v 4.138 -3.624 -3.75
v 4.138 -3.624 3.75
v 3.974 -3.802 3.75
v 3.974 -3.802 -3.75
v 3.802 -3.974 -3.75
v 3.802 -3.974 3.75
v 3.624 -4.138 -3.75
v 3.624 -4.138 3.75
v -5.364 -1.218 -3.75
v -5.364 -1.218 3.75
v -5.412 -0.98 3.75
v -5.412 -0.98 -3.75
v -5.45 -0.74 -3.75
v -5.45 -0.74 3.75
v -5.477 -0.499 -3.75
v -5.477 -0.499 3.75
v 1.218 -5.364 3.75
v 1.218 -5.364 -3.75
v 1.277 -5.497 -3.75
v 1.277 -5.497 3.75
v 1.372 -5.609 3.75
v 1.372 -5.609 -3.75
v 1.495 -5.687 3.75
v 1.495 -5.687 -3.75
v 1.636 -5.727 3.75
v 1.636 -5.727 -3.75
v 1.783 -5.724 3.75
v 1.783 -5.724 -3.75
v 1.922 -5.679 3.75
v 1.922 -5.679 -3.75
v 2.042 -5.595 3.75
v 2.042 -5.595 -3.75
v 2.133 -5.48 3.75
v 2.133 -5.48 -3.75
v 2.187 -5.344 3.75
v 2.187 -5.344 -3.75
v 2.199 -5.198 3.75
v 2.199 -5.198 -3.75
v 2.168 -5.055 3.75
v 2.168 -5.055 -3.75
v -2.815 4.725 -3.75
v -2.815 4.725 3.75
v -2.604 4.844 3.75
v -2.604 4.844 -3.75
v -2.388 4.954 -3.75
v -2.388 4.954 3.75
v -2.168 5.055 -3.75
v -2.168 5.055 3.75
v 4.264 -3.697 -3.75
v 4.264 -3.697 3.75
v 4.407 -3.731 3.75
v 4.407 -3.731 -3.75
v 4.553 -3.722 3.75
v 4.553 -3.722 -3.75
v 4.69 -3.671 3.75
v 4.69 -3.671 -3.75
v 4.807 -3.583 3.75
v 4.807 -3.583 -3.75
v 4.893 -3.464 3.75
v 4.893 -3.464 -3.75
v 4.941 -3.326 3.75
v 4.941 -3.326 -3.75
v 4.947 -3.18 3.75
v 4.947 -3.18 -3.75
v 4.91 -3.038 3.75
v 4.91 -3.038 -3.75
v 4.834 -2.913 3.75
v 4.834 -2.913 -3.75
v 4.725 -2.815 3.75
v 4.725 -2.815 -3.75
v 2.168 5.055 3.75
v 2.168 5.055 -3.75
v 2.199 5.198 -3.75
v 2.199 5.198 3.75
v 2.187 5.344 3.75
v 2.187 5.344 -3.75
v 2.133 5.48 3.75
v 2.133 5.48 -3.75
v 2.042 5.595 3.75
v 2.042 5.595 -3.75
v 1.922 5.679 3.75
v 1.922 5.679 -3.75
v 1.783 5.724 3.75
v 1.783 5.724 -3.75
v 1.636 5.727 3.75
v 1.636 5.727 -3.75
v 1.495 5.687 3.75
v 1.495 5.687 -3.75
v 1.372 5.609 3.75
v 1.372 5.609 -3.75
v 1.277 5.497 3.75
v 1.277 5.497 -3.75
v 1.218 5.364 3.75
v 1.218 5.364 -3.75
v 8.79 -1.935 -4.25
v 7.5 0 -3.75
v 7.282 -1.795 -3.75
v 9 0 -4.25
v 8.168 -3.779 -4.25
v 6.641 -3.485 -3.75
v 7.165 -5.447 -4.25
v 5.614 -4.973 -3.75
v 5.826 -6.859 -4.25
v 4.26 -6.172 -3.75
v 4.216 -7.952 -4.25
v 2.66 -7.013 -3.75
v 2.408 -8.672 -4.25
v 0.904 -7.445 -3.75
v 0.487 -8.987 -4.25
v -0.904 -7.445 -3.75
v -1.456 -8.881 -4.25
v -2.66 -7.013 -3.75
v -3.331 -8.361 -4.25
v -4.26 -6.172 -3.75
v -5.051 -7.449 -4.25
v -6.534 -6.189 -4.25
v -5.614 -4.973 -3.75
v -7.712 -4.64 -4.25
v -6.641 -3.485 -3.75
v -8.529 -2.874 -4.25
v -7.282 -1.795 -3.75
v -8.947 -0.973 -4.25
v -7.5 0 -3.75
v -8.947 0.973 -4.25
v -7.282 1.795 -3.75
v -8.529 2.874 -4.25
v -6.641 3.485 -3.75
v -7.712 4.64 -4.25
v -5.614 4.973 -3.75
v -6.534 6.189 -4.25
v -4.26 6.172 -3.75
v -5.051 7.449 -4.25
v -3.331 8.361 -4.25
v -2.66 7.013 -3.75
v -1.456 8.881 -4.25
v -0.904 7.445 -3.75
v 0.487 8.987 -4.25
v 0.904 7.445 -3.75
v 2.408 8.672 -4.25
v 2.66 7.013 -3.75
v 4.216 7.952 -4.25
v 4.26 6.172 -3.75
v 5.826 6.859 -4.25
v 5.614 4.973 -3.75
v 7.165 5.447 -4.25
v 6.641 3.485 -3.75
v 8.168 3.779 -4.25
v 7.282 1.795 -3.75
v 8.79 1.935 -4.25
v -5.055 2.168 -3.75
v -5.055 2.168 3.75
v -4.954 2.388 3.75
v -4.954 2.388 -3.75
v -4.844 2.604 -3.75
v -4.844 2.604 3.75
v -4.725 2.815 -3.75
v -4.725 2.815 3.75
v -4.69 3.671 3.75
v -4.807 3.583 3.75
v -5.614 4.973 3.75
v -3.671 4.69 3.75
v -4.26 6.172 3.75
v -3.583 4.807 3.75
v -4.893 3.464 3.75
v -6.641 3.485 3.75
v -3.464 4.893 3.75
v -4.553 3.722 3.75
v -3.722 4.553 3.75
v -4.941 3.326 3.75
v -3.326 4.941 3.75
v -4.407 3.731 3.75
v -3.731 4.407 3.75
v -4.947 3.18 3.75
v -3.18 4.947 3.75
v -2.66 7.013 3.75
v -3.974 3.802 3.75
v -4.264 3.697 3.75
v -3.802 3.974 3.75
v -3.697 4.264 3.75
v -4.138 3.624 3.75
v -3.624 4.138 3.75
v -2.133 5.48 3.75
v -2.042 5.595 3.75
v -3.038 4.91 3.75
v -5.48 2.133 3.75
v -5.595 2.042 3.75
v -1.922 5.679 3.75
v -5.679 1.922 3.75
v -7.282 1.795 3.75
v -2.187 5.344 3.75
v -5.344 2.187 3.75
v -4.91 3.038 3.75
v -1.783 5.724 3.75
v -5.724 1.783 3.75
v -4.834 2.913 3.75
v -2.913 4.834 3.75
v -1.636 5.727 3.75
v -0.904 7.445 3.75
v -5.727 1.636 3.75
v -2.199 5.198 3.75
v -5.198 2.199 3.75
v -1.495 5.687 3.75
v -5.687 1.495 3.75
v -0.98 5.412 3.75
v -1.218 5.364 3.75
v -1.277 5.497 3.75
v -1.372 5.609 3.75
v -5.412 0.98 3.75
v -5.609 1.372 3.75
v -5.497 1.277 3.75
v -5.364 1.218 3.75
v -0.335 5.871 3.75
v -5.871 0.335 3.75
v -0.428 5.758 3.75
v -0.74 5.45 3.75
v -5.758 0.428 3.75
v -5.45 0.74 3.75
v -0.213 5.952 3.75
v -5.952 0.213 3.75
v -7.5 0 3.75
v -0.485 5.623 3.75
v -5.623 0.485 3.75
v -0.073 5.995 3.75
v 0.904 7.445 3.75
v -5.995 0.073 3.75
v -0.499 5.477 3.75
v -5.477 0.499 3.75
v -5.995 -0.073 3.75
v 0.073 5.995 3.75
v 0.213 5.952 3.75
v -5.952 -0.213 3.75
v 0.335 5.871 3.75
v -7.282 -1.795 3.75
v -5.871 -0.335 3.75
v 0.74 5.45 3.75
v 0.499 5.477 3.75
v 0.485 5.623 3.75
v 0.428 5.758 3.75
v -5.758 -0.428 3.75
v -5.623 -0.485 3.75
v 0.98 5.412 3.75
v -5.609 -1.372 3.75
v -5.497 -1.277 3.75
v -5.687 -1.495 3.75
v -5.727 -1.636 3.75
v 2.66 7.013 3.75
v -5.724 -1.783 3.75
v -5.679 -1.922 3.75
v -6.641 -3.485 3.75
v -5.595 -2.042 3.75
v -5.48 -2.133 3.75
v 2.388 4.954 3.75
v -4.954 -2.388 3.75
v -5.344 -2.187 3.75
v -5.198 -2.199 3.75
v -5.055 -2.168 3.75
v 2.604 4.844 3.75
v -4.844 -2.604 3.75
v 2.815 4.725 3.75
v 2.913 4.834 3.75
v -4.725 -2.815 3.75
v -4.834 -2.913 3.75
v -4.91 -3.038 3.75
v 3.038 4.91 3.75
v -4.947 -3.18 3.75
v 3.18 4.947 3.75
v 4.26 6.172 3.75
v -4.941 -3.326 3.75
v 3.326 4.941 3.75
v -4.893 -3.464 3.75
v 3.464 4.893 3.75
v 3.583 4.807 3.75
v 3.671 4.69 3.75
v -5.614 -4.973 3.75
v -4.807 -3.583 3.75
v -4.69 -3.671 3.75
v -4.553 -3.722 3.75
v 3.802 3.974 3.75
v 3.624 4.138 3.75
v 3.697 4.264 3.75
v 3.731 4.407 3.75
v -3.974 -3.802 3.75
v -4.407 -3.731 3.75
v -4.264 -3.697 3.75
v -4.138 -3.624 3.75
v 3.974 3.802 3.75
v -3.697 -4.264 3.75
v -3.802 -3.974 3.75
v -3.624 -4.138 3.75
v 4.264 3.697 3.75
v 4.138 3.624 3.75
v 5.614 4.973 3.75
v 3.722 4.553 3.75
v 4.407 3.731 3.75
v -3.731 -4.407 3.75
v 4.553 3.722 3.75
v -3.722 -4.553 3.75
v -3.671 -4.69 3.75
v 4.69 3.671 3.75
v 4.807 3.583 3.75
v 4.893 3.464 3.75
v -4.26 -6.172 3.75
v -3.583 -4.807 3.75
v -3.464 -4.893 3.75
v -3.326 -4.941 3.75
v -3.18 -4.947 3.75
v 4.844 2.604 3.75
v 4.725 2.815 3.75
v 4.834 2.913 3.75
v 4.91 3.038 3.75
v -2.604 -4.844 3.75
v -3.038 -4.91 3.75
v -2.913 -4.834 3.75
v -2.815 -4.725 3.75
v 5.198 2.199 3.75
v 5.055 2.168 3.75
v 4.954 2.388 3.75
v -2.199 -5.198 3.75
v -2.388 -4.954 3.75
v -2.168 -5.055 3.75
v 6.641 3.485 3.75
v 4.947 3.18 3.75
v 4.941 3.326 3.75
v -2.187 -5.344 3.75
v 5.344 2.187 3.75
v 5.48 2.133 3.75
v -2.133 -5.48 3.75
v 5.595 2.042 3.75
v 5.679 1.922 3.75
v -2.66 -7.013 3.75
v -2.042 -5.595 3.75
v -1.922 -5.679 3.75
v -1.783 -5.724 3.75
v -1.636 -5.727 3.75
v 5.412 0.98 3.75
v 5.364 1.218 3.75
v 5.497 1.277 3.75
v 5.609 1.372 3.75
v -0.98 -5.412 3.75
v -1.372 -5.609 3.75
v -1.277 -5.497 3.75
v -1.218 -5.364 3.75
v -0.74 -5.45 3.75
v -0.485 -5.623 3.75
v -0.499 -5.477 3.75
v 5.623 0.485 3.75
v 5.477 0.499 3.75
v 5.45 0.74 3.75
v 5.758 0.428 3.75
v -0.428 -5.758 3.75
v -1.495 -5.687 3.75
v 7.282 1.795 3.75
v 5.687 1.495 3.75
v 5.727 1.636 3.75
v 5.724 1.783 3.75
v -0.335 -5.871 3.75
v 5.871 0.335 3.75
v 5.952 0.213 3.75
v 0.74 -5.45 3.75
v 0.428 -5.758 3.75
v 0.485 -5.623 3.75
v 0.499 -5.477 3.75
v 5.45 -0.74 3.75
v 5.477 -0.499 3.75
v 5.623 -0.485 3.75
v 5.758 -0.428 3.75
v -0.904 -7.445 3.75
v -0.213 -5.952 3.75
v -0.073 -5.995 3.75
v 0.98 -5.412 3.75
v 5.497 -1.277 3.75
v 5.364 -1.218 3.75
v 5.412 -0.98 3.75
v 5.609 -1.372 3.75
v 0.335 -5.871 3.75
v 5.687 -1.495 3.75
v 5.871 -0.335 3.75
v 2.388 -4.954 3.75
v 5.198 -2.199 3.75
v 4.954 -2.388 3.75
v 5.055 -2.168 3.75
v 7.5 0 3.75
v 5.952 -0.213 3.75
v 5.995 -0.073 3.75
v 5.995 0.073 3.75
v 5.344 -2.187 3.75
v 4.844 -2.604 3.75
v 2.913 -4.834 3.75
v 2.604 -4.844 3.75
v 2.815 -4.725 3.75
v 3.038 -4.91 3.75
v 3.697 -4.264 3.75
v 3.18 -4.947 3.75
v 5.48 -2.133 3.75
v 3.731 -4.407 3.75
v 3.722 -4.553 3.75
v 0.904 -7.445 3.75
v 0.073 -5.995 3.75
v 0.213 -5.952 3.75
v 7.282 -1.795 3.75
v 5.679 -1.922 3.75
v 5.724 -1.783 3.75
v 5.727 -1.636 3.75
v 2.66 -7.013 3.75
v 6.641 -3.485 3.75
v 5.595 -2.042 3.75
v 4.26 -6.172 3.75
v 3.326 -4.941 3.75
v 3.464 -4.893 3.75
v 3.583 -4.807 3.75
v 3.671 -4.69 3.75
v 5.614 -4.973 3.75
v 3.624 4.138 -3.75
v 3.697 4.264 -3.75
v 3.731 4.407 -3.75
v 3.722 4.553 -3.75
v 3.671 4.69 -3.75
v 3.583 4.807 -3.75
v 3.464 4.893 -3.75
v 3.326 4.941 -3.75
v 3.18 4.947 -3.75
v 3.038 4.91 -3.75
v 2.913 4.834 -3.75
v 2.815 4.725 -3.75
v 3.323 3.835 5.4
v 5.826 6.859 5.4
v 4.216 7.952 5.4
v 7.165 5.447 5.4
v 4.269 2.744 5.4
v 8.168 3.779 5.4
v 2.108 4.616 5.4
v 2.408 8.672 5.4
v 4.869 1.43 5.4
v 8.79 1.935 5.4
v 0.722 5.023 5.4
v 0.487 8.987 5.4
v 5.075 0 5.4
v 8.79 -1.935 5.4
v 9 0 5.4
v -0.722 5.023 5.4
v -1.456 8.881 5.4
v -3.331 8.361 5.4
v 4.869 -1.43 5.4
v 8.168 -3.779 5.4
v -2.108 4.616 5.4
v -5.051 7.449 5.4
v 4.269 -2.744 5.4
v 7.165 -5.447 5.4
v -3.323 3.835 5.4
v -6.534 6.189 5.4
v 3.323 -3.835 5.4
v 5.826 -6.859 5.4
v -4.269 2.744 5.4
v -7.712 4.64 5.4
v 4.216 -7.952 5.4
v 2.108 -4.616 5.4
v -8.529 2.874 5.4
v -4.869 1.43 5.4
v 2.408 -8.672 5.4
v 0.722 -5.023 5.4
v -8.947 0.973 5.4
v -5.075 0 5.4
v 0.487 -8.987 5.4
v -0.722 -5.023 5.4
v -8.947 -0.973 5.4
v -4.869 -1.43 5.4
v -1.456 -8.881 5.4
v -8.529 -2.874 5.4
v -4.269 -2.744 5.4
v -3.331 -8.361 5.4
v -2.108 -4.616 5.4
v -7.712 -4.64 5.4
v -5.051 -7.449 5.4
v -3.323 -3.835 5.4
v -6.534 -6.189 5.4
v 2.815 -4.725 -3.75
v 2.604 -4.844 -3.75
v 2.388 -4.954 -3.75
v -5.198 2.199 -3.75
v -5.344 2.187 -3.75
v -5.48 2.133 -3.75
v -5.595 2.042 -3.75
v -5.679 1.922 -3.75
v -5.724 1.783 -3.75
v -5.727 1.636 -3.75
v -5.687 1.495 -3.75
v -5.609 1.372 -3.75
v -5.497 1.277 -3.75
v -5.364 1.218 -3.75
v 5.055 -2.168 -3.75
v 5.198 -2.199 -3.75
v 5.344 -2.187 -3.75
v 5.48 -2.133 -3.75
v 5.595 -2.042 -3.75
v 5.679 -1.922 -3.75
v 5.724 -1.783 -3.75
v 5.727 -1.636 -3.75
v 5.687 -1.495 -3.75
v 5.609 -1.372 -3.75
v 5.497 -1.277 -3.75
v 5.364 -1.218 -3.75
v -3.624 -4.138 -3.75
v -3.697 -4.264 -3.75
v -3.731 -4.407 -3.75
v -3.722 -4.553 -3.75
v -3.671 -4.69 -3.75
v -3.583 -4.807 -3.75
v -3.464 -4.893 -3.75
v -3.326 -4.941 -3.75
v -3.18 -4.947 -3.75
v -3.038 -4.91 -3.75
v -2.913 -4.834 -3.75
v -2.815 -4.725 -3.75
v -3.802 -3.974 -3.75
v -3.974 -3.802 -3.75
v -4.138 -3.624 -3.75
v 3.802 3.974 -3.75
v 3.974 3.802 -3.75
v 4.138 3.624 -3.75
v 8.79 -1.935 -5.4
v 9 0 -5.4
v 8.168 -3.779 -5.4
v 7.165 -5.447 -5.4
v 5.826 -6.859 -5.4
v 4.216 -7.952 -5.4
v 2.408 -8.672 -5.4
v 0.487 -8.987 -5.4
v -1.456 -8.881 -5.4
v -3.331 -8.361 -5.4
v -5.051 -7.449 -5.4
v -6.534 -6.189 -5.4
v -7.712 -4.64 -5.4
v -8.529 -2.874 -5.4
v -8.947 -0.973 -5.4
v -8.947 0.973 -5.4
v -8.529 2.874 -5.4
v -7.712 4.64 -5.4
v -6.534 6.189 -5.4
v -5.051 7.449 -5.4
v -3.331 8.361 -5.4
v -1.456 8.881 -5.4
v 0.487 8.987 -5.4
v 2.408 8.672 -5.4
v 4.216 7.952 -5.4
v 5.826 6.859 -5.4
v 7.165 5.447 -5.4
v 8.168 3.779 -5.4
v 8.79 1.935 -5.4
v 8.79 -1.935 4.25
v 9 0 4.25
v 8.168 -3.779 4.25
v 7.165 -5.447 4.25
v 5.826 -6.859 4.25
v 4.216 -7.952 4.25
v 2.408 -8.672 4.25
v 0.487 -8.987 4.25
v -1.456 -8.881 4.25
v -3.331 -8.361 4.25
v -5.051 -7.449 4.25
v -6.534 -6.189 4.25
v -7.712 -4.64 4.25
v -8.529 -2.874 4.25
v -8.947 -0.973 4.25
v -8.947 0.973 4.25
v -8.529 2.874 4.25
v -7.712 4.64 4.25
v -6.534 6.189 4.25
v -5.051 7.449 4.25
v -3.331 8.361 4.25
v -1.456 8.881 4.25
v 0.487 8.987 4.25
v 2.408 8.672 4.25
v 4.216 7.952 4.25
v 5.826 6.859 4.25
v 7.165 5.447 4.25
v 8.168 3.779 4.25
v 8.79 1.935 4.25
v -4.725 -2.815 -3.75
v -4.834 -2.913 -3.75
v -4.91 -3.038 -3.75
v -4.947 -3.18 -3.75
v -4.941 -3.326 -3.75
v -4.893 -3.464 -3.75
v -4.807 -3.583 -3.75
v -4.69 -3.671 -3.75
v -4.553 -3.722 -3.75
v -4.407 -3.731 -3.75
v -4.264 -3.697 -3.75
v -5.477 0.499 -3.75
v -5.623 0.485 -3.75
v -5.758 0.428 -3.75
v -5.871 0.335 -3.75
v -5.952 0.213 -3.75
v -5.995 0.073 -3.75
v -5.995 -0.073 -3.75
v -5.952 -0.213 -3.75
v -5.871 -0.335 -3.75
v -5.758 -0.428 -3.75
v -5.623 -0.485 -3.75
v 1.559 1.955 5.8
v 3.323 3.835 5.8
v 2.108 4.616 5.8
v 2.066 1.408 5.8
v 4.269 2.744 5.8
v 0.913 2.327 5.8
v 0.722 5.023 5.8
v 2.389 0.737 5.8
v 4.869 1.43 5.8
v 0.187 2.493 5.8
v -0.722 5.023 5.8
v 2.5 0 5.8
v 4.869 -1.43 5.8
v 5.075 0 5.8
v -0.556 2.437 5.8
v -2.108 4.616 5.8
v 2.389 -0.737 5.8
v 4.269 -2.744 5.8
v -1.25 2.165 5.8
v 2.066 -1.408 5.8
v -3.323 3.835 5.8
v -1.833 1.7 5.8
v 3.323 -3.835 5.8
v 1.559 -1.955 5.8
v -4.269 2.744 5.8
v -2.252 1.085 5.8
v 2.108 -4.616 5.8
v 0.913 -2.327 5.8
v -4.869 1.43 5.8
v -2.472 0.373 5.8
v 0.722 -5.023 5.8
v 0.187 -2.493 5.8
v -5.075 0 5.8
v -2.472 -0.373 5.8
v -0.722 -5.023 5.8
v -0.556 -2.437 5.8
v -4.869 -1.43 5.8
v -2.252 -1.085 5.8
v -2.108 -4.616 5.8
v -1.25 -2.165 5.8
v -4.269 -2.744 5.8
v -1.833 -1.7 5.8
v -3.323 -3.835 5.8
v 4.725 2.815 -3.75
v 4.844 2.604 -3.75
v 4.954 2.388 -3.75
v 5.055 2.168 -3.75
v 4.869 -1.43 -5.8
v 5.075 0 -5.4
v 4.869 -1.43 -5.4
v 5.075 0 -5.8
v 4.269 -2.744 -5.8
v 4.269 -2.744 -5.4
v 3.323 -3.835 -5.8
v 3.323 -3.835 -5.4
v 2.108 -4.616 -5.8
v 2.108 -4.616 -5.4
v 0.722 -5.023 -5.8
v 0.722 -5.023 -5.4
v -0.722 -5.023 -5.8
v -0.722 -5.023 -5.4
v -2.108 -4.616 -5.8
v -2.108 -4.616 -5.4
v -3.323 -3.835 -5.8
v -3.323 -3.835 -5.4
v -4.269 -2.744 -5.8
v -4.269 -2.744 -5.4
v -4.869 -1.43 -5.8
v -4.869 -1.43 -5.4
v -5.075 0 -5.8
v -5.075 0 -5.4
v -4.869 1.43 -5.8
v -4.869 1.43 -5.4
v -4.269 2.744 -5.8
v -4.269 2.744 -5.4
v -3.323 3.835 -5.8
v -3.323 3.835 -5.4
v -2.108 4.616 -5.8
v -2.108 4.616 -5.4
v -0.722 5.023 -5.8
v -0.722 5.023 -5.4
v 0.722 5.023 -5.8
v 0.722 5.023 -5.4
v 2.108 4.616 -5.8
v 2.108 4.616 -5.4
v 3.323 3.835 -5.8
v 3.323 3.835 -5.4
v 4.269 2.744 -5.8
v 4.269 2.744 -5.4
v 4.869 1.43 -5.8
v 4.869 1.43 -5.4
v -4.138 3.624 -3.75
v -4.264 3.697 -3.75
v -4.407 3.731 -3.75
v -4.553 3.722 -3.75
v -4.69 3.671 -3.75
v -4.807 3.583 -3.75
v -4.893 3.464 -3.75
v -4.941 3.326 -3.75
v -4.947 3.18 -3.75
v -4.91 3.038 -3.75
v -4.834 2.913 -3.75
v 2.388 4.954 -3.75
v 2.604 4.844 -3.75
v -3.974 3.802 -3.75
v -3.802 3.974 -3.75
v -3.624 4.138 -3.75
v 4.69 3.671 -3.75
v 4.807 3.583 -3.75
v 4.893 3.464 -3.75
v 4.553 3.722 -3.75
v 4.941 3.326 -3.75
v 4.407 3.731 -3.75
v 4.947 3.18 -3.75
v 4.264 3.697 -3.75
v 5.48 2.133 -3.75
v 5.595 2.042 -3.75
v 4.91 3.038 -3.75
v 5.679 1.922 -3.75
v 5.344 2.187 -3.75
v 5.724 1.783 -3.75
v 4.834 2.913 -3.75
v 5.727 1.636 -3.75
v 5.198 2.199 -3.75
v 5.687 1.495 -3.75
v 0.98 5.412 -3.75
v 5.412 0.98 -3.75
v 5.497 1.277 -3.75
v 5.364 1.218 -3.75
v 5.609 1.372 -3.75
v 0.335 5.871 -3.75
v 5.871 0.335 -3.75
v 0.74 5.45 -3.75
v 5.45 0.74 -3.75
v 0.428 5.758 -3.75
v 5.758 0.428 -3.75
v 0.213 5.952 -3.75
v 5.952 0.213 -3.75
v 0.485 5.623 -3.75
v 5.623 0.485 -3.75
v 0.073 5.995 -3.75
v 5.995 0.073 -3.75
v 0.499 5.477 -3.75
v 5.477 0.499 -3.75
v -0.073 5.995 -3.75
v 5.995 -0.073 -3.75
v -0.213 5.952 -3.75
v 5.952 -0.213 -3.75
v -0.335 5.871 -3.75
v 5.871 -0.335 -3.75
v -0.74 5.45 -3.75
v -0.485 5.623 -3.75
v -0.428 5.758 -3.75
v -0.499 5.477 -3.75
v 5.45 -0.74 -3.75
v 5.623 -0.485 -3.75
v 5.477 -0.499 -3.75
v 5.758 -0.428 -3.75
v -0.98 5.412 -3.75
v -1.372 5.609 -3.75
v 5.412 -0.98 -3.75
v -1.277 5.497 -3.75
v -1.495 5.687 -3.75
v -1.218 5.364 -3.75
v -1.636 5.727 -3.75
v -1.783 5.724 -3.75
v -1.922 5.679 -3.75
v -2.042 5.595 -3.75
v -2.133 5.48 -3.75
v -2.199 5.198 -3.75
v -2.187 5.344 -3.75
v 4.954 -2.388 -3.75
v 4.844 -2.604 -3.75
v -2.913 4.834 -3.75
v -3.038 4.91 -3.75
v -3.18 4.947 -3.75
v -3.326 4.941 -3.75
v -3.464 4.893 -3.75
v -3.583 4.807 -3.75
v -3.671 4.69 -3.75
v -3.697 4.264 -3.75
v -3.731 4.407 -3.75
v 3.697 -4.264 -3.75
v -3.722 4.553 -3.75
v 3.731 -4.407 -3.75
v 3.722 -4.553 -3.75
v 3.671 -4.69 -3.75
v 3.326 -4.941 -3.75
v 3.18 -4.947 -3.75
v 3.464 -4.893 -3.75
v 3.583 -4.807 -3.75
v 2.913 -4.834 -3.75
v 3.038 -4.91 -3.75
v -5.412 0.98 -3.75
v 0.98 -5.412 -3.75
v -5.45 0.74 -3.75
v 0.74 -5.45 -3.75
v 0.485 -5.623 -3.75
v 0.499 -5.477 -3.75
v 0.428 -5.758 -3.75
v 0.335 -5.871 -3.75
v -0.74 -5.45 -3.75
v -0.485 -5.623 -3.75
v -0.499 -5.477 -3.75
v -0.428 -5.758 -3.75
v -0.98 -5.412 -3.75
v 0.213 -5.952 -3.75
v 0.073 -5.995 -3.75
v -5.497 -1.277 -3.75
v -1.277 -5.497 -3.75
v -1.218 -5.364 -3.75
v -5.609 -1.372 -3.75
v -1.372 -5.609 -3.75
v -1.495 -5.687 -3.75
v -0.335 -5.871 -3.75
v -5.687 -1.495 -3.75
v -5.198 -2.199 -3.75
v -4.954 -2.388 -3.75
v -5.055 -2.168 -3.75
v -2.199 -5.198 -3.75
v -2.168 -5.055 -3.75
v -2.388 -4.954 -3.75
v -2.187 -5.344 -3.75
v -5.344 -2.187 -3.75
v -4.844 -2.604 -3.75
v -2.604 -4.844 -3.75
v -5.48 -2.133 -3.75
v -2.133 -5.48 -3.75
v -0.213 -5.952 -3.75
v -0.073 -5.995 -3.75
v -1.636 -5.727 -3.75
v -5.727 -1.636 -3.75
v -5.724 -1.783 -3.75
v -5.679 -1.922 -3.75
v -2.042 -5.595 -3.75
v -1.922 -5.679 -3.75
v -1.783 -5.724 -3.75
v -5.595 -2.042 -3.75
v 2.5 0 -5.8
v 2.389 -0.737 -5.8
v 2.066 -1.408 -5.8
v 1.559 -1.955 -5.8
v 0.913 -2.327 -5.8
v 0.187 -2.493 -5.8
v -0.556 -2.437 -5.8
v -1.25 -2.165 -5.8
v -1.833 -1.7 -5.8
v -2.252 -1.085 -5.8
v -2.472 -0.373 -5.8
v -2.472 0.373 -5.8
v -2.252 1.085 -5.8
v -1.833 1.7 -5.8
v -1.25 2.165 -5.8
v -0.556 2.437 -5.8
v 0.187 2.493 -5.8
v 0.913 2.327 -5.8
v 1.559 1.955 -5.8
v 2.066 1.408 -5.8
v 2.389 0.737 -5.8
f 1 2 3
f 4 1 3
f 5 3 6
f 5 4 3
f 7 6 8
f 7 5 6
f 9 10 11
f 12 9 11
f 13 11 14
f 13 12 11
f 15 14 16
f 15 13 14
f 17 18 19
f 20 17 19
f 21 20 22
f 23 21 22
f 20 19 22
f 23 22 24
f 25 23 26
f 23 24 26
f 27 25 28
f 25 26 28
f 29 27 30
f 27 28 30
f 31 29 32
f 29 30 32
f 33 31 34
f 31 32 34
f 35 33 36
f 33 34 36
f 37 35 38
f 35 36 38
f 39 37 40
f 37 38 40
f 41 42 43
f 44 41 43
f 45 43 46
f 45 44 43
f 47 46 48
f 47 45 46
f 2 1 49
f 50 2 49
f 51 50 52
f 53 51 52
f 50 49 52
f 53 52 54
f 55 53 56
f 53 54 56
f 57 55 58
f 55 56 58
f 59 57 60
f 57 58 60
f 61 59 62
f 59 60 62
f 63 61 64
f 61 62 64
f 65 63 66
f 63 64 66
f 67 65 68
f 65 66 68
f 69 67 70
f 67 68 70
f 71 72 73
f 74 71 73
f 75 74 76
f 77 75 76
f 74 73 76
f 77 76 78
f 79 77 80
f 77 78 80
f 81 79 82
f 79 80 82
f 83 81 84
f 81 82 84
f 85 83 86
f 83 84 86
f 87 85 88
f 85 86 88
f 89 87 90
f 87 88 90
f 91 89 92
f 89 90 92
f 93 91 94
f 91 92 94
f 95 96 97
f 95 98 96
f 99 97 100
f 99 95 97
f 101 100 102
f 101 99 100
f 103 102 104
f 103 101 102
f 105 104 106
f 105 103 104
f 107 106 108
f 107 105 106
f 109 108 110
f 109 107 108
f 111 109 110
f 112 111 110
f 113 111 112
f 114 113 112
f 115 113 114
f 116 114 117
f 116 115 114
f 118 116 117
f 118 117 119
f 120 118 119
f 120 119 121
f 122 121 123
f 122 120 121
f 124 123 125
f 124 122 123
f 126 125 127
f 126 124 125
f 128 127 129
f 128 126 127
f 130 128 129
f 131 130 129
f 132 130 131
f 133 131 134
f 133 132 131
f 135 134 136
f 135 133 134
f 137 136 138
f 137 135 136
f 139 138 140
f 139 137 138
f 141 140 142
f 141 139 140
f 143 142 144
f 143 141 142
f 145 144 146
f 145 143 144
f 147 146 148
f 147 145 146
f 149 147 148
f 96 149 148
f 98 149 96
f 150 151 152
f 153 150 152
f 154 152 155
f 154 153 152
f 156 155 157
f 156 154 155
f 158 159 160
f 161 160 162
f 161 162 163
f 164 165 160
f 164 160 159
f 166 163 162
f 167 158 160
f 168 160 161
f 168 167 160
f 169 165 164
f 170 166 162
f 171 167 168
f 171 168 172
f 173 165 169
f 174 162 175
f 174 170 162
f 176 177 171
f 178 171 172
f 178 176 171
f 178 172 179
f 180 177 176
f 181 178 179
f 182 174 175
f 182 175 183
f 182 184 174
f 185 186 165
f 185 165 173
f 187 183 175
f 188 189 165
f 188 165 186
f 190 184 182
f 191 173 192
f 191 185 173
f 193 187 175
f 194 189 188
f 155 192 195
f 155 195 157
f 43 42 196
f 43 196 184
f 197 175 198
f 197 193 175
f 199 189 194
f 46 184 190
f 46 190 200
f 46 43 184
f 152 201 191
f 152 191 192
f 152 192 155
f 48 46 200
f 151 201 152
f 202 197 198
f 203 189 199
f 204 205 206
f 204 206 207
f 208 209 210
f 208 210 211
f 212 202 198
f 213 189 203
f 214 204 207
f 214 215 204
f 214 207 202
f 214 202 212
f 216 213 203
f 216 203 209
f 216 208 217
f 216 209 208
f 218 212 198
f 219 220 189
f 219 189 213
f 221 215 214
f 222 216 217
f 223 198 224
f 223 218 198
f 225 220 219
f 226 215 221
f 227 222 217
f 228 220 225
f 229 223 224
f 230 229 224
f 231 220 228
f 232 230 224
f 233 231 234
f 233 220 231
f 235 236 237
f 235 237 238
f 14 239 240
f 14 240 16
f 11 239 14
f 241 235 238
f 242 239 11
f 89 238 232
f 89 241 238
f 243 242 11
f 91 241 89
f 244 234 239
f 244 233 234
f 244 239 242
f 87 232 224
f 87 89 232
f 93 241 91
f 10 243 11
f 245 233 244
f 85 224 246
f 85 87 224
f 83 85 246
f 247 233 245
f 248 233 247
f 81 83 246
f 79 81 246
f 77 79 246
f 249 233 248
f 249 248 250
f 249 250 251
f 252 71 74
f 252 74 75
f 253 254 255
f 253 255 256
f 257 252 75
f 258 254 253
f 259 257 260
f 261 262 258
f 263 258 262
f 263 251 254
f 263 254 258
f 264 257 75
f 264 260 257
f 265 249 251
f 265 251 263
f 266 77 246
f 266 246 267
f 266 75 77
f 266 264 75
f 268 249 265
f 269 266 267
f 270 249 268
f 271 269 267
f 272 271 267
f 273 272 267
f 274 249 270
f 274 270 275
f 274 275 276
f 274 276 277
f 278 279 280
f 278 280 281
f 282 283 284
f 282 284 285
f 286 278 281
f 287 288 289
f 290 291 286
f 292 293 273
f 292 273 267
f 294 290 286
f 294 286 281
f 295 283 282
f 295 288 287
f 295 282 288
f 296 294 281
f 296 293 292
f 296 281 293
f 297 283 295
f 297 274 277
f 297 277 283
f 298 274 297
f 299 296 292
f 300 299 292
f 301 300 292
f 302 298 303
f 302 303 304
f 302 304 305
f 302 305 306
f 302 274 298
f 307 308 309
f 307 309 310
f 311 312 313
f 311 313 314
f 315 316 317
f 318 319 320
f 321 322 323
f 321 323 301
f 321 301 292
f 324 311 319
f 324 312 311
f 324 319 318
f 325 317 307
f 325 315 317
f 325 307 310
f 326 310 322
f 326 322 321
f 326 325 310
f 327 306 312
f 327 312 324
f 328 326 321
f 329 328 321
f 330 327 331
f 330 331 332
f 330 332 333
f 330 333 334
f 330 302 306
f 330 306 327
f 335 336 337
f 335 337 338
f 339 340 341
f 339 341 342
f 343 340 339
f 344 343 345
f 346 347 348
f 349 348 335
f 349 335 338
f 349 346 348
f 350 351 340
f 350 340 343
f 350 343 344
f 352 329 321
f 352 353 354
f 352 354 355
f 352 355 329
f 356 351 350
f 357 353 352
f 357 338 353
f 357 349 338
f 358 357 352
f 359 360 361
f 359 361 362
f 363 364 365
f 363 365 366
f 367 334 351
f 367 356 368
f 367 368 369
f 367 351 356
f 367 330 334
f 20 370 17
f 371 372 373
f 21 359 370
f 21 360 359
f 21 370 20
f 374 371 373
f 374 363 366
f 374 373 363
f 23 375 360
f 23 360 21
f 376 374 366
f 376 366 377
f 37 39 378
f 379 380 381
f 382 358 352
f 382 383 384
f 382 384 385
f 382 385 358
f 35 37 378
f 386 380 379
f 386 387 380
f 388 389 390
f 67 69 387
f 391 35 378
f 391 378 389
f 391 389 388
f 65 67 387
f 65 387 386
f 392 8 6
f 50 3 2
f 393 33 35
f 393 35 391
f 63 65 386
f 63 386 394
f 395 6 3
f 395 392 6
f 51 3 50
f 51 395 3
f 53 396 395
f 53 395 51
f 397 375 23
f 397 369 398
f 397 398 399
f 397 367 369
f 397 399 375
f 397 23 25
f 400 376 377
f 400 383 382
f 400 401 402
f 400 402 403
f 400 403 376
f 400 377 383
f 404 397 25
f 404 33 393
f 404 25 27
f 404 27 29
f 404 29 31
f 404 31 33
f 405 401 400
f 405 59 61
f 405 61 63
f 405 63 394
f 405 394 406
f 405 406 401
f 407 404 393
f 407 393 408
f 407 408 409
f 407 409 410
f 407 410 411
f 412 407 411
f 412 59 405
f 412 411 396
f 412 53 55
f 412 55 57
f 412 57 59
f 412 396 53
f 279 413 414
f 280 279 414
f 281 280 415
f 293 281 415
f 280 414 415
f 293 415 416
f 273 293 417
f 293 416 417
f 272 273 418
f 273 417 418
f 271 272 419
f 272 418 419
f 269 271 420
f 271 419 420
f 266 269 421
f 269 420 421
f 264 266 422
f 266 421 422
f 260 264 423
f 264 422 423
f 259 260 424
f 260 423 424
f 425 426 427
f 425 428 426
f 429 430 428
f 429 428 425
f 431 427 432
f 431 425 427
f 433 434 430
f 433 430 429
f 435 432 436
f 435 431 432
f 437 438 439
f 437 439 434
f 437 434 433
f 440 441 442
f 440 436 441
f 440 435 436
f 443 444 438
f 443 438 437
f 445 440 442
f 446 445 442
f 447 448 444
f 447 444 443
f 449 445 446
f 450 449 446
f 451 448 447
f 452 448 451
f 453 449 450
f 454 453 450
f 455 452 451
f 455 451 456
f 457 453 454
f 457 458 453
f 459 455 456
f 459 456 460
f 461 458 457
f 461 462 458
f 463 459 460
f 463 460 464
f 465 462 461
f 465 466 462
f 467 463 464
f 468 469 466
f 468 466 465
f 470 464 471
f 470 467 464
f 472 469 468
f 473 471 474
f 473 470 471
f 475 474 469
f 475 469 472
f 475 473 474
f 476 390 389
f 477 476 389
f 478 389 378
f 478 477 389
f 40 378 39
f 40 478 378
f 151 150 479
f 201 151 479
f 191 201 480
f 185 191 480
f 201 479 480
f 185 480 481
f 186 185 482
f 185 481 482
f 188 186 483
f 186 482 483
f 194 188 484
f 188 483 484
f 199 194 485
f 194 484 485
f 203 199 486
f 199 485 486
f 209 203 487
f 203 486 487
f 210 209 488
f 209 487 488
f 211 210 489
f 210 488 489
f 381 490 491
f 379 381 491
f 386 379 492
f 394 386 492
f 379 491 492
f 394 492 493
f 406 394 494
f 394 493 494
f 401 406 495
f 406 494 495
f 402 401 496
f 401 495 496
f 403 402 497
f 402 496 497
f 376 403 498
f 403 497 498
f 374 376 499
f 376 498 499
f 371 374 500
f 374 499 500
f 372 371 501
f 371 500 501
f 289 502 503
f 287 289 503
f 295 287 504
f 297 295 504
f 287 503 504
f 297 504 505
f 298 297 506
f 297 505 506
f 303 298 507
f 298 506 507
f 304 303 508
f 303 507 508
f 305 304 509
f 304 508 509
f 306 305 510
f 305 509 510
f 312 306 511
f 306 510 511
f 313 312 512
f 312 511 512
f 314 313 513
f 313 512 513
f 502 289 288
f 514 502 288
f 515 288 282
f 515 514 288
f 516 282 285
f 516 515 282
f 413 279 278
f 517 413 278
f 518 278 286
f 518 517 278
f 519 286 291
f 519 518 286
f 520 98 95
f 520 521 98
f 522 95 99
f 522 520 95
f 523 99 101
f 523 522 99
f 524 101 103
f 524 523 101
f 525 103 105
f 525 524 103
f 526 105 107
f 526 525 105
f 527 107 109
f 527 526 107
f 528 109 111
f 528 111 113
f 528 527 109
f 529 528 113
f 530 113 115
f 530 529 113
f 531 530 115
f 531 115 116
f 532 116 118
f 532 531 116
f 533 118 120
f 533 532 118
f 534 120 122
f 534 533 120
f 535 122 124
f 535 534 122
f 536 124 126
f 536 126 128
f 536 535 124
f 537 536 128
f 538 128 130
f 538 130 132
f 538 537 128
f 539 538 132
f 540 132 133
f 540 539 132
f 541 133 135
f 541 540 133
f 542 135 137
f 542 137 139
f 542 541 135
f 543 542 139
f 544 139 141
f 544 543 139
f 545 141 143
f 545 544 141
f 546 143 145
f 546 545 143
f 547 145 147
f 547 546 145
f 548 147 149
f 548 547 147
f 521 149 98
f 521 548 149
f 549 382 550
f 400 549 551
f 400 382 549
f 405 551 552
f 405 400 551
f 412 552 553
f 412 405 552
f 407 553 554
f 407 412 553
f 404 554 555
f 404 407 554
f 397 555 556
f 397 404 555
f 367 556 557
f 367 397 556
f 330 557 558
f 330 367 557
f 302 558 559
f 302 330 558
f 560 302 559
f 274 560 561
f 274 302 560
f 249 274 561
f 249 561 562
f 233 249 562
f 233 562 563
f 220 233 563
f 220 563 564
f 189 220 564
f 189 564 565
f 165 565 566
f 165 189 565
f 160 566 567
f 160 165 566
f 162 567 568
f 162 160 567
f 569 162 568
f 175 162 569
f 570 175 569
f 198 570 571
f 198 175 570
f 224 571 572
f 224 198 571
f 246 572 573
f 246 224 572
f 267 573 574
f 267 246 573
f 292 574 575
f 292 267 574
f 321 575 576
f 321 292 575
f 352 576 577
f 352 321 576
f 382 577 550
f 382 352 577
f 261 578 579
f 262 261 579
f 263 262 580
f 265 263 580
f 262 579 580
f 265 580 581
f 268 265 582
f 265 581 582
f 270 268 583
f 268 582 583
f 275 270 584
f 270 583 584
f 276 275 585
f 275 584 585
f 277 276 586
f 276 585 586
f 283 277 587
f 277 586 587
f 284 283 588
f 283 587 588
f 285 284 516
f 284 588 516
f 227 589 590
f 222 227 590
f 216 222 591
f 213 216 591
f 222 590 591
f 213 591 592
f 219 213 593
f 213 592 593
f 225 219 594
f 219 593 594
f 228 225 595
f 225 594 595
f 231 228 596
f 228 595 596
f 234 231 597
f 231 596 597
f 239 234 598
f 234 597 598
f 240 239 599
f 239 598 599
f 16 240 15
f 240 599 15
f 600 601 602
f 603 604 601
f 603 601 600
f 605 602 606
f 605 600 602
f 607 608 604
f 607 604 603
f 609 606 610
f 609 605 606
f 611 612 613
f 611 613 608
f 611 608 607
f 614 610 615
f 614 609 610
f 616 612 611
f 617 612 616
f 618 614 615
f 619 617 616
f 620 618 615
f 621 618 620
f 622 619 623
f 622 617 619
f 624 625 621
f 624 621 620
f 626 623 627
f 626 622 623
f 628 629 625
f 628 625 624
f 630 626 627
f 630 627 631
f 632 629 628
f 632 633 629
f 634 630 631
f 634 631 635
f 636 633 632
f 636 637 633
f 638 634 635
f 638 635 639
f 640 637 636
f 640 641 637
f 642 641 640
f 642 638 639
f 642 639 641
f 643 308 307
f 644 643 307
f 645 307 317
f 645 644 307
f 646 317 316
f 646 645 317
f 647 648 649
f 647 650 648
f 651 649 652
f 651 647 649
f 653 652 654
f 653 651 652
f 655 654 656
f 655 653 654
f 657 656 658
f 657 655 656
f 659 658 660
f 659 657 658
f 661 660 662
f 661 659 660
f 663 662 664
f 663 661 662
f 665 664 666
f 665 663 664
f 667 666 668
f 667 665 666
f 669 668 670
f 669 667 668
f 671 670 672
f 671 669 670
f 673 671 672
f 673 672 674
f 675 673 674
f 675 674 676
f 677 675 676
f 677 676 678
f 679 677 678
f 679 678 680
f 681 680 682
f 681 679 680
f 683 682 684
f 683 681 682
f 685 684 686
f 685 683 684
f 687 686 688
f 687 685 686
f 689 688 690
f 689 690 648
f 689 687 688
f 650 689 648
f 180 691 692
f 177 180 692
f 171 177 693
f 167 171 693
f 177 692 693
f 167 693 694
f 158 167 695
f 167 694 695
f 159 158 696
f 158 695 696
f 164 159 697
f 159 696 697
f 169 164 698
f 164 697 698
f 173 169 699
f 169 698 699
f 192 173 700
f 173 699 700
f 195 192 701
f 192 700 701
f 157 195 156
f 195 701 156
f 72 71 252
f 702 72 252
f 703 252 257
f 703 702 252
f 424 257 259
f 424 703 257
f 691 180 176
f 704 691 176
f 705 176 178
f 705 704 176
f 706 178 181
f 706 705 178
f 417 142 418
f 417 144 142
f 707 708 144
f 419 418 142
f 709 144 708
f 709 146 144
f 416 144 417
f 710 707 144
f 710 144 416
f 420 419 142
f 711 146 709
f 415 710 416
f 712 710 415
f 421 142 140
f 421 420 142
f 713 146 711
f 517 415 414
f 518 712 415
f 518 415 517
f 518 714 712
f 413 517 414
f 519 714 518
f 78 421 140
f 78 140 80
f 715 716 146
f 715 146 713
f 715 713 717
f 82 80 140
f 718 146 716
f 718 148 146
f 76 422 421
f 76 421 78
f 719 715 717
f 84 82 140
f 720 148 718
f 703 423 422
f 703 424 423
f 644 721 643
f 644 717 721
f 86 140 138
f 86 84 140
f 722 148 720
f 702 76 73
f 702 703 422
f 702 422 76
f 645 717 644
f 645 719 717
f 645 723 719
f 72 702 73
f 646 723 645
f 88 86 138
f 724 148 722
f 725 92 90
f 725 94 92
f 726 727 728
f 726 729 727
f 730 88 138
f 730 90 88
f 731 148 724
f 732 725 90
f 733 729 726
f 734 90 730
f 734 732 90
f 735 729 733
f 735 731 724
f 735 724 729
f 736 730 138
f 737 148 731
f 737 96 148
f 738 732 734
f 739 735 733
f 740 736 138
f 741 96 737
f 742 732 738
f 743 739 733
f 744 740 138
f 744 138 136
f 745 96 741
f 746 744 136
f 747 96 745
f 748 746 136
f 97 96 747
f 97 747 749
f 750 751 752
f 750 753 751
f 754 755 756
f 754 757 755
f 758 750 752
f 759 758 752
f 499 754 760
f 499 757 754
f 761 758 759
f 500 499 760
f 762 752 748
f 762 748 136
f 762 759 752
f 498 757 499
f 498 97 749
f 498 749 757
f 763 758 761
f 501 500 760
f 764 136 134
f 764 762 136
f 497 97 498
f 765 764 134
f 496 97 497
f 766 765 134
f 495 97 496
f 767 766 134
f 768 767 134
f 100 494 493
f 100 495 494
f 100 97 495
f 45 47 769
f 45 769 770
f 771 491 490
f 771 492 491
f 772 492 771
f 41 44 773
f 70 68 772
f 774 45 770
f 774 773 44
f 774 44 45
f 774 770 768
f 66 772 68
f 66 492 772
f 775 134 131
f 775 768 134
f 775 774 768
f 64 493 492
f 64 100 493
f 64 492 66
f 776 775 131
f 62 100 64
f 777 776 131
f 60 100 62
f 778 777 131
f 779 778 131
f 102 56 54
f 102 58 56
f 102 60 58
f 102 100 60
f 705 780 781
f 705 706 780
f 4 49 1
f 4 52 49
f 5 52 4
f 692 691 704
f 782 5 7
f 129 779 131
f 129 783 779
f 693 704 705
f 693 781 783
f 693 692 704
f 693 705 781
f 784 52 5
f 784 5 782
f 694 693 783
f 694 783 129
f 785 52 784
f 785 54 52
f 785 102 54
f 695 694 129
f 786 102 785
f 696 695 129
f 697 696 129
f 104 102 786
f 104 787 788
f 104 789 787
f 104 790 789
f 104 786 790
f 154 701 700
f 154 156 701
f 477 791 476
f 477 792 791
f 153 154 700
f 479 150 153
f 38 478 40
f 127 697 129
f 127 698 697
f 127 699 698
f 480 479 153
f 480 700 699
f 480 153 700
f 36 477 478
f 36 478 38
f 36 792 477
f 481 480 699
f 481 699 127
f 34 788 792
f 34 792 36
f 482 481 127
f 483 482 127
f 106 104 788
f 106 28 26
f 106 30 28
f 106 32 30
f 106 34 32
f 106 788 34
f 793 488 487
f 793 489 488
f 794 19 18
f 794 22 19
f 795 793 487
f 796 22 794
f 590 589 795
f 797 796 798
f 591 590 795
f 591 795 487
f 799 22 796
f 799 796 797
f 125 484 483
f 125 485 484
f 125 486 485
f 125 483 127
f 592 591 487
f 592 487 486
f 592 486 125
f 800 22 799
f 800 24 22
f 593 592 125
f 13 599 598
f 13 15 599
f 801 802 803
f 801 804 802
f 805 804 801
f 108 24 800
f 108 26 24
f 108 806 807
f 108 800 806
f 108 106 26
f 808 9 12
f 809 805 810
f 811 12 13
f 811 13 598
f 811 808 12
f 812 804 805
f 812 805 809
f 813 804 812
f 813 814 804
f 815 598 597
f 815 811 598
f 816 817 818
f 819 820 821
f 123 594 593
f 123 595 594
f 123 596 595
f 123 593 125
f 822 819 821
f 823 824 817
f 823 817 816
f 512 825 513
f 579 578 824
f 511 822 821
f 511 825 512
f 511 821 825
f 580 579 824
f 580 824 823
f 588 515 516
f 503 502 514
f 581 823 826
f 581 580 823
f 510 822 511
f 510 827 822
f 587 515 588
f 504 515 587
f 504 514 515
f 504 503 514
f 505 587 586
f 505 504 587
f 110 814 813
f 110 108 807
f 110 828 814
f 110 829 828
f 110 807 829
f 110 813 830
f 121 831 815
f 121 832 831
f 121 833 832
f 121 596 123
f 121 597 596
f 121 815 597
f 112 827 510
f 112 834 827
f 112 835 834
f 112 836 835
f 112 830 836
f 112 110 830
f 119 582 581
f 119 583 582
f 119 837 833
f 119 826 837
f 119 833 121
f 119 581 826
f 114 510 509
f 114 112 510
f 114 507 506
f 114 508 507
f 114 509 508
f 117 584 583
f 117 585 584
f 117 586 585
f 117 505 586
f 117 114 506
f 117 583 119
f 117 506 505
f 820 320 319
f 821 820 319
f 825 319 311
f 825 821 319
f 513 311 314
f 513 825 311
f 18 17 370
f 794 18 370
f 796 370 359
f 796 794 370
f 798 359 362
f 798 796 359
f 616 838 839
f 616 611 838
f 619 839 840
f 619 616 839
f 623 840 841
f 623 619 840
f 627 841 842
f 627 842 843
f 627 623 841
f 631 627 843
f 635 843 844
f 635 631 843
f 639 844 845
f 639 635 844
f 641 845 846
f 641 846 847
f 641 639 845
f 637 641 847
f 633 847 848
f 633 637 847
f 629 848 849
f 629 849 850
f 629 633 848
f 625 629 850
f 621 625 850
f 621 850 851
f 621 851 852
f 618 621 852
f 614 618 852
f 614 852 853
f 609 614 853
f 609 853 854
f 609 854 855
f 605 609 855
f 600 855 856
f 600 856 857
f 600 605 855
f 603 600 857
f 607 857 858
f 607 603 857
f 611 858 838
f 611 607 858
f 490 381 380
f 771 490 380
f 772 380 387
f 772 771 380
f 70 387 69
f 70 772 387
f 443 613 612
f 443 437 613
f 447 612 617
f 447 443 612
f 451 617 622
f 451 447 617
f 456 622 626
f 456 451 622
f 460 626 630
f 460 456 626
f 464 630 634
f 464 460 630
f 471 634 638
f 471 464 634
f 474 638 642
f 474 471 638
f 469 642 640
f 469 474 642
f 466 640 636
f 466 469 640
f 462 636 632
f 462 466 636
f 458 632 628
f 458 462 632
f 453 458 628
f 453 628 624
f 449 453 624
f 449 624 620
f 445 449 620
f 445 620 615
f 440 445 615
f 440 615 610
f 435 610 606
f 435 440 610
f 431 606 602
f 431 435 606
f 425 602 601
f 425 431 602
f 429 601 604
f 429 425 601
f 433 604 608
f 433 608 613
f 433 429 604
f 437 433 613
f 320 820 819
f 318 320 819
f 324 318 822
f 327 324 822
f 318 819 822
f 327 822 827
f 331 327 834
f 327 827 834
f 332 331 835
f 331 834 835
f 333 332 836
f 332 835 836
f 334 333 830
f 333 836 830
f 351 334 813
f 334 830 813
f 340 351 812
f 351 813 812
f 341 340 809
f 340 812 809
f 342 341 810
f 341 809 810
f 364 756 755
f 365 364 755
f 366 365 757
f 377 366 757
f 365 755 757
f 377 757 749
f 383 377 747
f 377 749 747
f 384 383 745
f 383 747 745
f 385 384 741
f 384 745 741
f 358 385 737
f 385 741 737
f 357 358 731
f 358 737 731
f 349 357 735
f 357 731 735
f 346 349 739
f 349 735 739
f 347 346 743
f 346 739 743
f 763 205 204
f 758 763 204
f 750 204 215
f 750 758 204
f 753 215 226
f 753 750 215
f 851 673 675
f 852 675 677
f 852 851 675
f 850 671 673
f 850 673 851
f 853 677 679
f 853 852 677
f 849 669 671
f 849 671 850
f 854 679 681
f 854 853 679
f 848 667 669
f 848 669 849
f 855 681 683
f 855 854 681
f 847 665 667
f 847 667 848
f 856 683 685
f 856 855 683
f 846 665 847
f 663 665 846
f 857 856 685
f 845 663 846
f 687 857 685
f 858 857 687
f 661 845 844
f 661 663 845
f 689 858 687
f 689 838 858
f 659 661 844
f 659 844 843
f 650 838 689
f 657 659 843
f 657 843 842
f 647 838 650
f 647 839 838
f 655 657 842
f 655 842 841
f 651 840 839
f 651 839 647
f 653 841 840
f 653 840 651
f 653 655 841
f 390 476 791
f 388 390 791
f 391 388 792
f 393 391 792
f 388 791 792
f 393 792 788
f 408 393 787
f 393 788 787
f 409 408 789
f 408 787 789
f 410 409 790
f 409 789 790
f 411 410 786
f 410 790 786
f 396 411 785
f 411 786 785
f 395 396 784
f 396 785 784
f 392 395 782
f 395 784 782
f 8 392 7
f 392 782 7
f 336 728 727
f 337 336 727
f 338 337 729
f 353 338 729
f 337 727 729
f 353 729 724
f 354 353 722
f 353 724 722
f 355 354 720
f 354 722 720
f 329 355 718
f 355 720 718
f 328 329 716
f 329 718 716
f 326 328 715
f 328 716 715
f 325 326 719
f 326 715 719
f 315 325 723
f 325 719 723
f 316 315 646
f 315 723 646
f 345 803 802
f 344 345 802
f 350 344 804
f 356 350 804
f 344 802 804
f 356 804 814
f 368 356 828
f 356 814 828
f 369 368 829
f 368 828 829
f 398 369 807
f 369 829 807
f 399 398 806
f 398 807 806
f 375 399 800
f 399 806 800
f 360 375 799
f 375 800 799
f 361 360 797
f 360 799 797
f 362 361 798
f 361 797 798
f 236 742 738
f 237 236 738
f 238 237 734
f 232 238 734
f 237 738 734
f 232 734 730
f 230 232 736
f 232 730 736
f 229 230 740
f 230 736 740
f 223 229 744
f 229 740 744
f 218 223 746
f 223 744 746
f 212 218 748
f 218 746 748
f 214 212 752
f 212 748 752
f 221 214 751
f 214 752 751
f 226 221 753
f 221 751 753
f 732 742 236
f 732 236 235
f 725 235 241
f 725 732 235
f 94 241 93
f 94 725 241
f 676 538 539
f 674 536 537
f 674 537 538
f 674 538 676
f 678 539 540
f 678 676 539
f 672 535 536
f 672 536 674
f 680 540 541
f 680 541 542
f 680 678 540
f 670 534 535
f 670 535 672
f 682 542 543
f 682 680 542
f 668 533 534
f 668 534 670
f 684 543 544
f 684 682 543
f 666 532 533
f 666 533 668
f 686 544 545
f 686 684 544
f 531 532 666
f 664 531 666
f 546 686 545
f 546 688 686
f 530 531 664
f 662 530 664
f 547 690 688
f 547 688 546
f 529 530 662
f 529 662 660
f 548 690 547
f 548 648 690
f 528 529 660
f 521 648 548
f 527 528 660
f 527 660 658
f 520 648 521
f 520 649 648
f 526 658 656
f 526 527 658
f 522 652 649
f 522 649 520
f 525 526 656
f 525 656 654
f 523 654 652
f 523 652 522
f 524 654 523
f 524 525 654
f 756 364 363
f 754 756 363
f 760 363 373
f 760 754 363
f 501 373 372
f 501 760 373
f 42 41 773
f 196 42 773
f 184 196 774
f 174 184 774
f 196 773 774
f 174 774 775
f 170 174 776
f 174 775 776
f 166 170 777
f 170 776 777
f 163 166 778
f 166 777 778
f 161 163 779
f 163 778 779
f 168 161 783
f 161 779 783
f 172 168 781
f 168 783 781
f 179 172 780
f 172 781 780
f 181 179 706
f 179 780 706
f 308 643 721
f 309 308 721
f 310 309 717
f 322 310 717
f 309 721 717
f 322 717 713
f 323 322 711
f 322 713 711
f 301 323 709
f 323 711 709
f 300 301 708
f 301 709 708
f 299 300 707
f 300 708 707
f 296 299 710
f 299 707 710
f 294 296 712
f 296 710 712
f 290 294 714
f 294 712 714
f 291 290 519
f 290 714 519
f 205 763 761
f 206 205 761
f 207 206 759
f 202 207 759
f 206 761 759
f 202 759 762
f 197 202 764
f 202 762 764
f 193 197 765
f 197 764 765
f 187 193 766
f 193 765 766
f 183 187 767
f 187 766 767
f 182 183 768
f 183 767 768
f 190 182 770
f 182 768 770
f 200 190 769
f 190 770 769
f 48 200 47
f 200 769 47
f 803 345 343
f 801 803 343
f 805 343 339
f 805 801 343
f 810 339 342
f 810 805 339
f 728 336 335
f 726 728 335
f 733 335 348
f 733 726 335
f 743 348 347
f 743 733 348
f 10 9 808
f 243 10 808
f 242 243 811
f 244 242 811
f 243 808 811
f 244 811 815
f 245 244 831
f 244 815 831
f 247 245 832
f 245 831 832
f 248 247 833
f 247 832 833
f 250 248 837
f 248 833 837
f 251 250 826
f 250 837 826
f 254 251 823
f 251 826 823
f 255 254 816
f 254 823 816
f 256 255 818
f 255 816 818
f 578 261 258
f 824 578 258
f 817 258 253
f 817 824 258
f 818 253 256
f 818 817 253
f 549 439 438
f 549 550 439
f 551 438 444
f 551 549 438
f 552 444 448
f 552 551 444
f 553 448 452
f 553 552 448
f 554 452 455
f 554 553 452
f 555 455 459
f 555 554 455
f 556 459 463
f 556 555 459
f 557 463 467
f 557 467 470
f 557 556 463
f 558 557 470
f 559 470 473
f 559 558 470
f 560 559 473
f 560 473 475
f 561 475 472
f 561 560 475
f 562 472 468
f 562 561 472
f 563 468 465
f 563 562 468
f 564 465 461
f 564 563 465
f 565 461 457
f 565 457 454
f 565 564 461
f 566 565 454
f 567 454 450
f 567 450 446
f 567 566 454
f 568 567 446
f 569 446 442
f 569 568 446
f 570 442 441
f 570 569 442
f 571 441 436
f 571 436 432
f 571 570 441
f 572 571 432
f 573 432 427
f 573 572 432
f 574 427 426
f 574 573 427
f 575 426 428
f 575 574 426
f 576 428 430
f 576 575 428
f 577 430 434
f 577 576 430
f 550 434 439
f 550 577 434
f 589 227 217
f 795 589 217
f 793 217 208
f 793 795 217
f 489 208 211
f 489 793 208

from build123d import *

# Parameters (mm, degrees)
BOSS_EXTRUDE1_DEPTH = 7.5
CIRPATTERN1_COUNT   = 20


with BuildPart() as part:
    # Sketch1 → Revolve1 (revolve)
    with BuildSketch(Plane(origin=(0, 0, 0), x_dir=(0, 0, -1), z_dir=(1, 0, 0)), mode=Mode.PRIVATE) as revolve1_sk:
        Polygon((-3.75, 7.5), (-3.75, 5.5), (3.75, 5.5), (3.75, 7.5), (4.25, 9), (5.4, 9), (5.4, 5.075), (5.8, 5.075), (5.8, 2.5), (-5.8, 2.5), (-5.8, 5.075), (-5.4, 5.075), (-5.4, 9), (-4.25, 9), align=None)
    revolve(revolve1_sk.sketch.rotate(Axis((0, 0, 0), (0, 0, -1)), 90), axis=Axis((0, 0, 0), (0, 0, -1)))

    # Sketch2 → Boss-Extrude1 (add)
    with BuildSketch(Plane.XY.offset(-3.75)):
        with BuildLine():
            ThreePointArc((0.499483204, 5.477272727), (0, 6), (-0.499483204, 5.477272727))
            ThreePointArc((-0.499483204, 5.477272727), (0, 5.5), (0.499483204, 5.477272727))
        make_face()
    boss_extrude1 = extrude(amount=BOSS_EXTRUDE1_DEPTH)

    # CirPattern1: Boss-Extrude1 ×20 about axis
    cirpattern1_axis = Axis((0, 0, 0), (0, 0, 1))
    for i in range(1, CIRPATTERN1_COUNT):
        add(boss_extrude1.rotate(cirpattern1_axis, i * 360 / CIRPATTERN1_COUNT))


solid = part.part
